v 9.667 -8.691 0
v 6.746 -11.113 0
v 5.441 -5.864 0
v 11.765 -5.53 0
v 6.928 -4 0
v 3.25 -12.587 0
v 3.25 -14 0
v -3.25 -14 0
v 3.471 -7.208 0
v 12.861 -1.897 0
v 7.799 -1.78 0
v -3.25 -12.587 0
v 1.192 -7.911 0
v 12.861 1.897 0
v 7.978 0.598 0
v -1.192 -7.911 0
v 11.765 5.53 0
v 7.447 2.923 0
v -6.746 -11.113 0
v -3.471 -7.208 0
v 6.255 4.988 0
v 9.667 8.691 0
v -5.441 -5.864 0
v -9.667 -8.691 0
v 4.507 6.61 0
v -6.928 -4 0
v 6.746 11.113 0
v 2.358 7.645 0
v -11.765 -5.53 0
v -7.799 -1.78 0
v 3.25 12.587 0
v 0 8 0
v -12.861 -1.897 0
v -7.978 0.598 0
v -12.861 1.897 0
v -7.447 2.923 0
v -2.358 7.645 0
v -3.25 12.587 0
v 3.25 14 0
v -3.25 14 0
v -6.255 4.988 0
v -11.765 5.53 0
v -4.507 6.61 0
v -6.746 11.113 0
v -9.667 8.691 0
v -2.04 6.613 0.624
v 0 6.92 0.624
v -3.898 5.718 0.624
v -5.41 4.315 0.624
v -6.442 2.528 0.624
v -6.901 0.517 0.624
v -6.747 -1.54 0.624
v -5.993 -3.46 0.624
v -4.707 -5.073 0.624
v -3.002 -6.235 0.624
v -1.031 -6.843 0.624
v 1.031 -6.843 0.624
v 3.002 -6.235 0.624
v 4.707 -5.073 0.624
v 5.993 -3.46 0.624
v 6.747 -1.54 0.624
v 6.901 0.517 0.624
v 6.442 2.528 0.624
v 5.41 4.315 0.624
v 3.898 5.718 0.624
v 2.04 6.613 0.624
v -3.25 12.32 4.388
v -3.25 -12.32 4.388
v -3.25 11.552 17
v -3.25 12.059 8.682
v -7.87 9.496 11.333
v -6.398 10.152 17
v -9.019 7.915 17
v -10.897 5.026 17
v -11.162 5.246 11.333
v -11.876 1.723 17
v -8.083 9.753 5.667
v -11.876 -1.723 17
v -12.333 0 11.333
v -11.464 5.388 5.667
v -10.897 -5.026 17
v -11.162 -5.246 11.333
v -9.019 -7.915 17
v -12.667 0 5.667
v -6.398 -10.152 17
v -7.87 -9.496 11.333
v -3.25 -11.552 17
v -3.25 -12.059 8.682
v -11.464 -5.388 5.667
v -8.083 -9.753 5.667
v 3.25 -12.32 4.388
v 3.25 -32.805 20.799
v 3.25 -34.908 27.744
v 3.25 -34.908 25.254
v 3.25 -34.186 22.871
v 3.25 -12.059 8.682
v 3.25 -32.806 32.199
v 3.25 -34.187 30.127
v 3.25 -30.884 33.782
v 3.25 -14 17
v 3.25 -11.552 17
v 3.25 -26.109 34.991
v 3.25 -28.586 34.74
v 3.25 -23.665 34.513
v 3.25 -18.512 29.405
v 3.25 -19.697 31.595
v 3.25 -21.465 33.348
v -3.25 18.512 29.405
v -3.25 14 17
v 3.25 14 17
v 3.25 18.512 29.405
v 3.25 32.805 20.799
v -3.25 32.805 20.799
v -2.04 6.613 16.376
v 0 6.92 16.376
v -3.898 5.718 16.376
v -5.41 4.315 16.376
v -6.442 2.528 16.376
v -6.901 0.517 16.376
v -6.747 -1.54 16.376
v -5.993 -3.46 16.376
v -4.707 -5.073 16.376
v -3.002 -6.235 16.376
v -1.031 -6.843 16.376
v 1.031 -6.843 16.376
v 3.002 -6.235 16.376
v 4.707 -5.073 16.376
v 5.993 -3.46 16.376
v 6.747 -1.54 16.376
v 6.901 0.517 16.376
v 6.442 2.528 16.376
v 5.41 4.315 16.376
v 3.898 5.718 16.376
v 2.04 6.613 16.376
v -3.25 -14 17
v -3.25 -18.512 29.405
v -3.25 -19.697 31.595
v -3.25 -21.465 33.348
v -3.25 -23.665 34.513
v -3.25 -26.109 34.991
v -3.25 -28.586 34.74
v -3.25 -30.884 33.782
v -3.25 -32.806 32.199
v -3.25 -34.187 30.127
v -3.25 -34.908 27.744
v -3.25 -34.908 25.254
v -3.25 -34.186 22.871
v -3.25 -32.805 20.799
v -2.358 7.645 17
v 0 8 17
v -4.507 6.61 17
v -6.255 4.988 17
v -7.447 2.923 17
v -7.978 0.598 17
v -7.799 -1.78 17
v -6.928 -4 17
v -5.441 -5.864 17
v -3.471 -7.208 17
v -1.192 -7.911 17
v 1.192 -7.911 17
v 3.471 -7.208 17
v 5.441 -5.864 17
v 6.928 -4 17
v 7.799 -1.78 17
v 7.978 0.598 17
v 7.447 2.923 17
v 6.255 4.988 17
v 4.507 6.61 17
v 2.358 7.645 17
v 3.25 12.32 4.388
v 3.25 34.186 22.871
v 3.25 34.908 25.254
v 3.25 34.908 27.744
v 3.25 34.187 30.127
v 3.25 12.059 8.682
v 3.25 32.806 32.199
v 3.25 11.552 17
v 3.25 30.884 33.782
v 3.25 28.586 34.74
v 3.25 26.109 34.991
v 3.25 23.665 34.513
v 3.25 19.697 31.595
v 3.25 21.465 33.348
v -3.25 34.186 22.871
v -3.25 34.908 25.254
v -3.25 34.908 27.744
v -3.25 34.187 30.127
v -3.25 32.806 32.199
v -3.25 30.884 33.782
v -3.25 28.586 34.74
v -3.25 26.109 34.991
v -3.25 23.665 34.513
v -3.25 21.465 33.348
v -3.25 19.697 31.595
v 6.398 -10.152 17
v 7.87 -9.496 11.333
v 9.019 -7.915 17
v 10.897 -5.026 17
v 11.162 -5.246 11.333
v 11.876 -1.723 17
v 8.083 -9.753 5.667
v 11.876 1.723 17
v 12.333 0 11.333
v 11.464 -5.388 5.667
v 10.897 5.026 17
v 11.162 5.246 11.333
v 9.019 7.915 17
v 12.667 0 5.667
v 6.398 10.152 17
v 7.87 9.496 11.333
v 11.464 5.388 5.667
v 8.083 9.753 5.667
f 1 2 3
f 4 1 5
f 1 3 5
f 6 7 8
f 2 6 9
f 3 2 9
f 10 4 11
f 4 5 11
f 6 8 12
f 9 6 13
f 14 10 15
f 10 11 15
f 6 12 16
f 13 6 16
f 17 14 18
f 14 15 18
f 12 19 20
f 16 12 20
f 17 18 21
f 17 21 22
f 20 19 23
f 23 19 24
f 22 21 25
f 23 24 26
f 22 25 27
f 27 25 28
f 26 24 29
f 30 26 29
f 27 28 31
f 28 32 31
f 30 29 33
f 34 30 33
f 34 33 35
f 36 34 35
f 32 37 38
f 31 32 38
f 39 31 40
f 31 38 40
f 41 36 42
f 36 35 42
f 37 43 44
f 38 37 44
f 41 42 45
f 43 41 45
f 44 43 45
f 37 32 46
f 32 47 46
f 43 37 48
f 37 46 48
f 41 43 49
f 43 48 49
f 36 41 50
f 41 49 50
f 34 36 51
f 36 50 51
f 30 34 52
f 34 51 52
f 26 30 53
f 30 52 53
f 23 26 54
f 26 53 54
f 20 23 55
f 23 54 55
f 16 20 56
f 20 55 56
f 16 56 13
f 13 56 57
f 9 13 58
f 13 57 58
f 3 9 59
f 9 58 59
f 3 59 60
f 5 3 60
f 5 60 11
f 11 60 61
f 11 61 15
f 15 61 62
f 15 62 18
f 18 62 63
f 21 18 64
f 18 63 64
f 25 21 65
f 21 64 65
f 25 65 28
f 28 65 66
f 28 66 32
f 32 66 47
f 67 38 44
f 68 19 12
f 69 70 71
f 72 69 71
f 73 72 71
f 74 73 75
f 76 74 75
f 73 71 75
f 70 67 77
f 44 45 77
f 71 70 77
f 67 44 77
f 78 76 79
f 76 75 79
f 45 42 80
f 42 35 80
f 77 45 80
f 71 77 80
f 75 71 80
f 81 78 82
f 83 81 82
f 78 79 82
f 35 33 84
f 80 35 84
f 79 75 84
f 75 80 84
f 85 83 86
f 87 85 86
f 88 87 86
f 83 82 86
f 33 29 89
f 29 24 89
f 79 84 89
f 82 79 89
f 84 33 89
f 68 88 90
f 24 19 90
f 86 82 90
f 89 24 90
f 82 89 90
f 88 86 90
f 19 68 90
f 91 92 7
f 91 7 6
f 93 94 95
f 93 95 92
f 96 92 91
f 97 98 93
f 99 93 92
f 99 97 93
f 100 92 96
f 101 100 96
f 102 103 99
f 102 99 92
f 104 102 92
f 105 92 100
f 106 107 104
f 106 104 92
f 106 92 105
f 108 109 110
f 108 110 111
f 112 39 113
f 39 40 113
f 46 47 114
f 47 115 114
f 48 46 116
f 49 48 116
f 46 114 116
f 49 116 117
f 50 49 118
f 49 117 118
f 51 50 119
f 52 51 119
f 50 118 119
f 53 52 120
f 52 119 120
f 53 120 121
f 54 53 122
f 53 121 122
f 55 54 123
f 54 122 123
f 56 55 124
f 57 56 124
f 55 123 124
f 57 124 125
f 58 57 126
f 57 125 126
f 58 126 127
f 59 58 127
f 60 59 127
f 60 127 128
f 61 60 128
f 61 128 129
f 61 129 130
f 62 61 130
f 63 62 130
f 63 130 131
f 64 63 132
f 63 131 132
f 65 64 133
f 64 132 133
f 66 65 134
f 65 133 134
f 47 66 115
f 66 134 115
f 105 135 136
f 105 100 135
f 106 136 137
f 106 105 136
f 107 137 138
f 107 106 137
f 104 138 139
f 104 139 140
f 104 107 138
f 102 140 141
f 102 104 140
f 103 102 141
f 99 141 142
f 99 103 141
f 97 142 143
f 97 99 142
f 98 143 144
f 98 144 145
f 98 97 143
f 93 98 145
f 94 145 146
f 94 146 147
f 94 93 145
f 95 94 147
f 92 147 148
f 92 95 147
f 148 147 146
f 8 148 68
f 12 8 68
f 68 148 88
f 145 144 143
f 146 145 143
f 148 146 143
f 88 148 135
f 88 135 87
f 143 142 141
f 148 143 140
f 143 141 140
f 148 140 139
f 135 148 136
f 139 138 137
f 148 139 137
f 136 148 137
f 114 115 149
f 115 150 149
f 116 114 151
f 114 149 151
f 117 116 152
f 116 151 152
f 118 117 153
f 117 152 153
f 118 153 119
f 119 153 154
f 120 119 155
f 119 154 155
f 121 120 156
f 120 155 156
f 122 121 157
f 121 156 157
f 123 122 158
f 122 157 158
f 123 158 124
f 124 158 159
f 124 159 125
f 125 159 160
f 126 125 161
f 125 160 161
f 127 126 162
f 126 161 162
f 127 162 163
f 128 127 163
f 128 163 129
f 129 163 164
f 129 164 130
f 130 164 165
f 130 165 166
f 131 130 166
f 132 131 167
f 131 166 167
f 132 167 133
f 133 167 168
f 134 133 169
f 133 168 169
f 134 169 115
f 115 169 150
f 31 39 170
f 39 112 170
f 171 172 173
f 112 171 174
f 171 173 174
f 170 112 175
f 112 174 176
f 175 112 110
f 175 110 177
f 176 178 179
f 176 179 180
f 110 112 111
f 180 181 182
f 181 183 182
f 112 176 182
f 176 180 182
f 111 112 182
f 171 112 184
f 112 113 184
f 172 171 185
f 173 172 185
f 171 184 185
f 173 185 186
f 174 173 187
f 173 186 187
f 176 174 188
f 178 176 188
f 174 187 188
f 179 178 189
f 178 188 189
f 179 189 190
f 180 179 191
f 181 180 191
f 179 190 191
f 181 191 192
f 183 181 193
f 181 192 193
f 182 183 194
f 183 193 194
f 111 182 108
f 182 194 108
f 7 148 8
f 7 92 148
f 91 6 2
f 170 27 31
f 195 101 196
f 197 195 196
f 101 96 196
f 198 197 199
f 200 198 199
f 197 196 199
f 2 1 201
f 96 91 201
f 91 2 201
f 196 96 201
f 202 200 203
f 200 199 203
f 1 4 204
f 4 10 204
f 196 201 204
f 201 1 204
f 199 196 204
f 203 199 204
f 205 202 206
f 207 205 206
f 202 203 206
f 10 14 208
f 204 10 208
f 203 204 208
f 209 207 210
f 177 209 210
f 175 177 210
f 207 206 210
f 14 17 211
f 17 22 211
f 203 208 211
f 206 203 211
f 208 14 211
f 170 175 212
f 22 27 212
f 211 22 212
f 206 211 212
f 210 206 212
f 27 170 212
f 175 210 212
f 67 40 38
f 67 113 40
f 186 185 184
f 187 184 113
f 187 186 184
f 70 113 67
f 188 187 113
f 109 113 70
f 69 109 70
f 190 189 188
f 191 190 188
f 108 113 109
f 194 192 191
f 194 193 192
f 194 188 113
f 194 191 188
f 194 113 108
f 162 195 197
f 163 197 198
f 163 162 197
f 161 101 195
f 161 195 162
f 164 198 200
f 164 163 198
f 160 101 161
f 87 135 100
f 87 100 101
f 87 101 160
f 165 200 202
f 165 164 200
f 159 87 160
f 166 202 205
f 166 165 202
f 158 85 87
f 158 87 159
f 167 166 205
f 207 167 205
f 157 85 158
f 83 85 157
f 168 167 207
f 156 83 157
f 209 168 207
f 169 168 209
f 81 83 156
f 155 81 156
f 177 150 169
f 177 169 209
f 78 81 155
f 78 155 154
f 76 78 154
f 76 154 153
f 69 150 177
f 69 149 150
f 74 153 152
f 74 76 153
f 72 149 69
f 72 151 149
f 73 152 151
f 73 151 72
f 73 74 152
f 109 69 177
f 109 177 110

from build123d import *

# Parameters (mm, degrees)
PAD_DEPTH = 3.25


with BuildPart() as pad:
    # Sketch001 → Pad (new body, symmetric)
    with BuildSketch(Plane.YZ):
        with BuildLine():
            Line((8.5, 0), (8.5, 17))
            Line((8.5, 17), (14, 17))
            Line((14, 17), (18.511951, 29.405352))
            ThreePointArc((32.805084, 20.799482), (30.884444, 33.78194), (18.511951, 29.405352))
            Line((14, 0), (32.805084, 20.799482))
            Line((8.5, 0), (14, 0))
        make_face()
        with BuildLine():
            Line((-32.80508, 20.799452), (-13.999963, 0))
            Line((-13.999963, 0), (-8.499963, 0))
            Line((-8.499963, 0), (-8.499963, 17))
            Line((-8.499963, 17), (-13.999963, 17))
            Line((-13.999963, 17), (-18.511955, 29.405337))
            ThreePointArc((-18.511955, 29.405337), (-30.884451, 33.781911), (-32.80508, 20.799452))
        make_face()
    extrude(amount=PAD_DEPTH, both=True)


with BuildPart() as fl_gelmutter_din_315_m16:
    # Sketch → Revolution (revolve)
    with BuildSketch(Plane.YZ):
        Polygon((8, 0), (6.92, 0.623538), (6.92, 16.376462), (8, 17), (12, 17), (13, 0), align=None)
    revolve(axis=Axis((0, 0, 0), (0, 0, 1)))

    # Fusion: union Pad
    add(pad.part)


solid = fl_gelmutter_din_315_m16.part
